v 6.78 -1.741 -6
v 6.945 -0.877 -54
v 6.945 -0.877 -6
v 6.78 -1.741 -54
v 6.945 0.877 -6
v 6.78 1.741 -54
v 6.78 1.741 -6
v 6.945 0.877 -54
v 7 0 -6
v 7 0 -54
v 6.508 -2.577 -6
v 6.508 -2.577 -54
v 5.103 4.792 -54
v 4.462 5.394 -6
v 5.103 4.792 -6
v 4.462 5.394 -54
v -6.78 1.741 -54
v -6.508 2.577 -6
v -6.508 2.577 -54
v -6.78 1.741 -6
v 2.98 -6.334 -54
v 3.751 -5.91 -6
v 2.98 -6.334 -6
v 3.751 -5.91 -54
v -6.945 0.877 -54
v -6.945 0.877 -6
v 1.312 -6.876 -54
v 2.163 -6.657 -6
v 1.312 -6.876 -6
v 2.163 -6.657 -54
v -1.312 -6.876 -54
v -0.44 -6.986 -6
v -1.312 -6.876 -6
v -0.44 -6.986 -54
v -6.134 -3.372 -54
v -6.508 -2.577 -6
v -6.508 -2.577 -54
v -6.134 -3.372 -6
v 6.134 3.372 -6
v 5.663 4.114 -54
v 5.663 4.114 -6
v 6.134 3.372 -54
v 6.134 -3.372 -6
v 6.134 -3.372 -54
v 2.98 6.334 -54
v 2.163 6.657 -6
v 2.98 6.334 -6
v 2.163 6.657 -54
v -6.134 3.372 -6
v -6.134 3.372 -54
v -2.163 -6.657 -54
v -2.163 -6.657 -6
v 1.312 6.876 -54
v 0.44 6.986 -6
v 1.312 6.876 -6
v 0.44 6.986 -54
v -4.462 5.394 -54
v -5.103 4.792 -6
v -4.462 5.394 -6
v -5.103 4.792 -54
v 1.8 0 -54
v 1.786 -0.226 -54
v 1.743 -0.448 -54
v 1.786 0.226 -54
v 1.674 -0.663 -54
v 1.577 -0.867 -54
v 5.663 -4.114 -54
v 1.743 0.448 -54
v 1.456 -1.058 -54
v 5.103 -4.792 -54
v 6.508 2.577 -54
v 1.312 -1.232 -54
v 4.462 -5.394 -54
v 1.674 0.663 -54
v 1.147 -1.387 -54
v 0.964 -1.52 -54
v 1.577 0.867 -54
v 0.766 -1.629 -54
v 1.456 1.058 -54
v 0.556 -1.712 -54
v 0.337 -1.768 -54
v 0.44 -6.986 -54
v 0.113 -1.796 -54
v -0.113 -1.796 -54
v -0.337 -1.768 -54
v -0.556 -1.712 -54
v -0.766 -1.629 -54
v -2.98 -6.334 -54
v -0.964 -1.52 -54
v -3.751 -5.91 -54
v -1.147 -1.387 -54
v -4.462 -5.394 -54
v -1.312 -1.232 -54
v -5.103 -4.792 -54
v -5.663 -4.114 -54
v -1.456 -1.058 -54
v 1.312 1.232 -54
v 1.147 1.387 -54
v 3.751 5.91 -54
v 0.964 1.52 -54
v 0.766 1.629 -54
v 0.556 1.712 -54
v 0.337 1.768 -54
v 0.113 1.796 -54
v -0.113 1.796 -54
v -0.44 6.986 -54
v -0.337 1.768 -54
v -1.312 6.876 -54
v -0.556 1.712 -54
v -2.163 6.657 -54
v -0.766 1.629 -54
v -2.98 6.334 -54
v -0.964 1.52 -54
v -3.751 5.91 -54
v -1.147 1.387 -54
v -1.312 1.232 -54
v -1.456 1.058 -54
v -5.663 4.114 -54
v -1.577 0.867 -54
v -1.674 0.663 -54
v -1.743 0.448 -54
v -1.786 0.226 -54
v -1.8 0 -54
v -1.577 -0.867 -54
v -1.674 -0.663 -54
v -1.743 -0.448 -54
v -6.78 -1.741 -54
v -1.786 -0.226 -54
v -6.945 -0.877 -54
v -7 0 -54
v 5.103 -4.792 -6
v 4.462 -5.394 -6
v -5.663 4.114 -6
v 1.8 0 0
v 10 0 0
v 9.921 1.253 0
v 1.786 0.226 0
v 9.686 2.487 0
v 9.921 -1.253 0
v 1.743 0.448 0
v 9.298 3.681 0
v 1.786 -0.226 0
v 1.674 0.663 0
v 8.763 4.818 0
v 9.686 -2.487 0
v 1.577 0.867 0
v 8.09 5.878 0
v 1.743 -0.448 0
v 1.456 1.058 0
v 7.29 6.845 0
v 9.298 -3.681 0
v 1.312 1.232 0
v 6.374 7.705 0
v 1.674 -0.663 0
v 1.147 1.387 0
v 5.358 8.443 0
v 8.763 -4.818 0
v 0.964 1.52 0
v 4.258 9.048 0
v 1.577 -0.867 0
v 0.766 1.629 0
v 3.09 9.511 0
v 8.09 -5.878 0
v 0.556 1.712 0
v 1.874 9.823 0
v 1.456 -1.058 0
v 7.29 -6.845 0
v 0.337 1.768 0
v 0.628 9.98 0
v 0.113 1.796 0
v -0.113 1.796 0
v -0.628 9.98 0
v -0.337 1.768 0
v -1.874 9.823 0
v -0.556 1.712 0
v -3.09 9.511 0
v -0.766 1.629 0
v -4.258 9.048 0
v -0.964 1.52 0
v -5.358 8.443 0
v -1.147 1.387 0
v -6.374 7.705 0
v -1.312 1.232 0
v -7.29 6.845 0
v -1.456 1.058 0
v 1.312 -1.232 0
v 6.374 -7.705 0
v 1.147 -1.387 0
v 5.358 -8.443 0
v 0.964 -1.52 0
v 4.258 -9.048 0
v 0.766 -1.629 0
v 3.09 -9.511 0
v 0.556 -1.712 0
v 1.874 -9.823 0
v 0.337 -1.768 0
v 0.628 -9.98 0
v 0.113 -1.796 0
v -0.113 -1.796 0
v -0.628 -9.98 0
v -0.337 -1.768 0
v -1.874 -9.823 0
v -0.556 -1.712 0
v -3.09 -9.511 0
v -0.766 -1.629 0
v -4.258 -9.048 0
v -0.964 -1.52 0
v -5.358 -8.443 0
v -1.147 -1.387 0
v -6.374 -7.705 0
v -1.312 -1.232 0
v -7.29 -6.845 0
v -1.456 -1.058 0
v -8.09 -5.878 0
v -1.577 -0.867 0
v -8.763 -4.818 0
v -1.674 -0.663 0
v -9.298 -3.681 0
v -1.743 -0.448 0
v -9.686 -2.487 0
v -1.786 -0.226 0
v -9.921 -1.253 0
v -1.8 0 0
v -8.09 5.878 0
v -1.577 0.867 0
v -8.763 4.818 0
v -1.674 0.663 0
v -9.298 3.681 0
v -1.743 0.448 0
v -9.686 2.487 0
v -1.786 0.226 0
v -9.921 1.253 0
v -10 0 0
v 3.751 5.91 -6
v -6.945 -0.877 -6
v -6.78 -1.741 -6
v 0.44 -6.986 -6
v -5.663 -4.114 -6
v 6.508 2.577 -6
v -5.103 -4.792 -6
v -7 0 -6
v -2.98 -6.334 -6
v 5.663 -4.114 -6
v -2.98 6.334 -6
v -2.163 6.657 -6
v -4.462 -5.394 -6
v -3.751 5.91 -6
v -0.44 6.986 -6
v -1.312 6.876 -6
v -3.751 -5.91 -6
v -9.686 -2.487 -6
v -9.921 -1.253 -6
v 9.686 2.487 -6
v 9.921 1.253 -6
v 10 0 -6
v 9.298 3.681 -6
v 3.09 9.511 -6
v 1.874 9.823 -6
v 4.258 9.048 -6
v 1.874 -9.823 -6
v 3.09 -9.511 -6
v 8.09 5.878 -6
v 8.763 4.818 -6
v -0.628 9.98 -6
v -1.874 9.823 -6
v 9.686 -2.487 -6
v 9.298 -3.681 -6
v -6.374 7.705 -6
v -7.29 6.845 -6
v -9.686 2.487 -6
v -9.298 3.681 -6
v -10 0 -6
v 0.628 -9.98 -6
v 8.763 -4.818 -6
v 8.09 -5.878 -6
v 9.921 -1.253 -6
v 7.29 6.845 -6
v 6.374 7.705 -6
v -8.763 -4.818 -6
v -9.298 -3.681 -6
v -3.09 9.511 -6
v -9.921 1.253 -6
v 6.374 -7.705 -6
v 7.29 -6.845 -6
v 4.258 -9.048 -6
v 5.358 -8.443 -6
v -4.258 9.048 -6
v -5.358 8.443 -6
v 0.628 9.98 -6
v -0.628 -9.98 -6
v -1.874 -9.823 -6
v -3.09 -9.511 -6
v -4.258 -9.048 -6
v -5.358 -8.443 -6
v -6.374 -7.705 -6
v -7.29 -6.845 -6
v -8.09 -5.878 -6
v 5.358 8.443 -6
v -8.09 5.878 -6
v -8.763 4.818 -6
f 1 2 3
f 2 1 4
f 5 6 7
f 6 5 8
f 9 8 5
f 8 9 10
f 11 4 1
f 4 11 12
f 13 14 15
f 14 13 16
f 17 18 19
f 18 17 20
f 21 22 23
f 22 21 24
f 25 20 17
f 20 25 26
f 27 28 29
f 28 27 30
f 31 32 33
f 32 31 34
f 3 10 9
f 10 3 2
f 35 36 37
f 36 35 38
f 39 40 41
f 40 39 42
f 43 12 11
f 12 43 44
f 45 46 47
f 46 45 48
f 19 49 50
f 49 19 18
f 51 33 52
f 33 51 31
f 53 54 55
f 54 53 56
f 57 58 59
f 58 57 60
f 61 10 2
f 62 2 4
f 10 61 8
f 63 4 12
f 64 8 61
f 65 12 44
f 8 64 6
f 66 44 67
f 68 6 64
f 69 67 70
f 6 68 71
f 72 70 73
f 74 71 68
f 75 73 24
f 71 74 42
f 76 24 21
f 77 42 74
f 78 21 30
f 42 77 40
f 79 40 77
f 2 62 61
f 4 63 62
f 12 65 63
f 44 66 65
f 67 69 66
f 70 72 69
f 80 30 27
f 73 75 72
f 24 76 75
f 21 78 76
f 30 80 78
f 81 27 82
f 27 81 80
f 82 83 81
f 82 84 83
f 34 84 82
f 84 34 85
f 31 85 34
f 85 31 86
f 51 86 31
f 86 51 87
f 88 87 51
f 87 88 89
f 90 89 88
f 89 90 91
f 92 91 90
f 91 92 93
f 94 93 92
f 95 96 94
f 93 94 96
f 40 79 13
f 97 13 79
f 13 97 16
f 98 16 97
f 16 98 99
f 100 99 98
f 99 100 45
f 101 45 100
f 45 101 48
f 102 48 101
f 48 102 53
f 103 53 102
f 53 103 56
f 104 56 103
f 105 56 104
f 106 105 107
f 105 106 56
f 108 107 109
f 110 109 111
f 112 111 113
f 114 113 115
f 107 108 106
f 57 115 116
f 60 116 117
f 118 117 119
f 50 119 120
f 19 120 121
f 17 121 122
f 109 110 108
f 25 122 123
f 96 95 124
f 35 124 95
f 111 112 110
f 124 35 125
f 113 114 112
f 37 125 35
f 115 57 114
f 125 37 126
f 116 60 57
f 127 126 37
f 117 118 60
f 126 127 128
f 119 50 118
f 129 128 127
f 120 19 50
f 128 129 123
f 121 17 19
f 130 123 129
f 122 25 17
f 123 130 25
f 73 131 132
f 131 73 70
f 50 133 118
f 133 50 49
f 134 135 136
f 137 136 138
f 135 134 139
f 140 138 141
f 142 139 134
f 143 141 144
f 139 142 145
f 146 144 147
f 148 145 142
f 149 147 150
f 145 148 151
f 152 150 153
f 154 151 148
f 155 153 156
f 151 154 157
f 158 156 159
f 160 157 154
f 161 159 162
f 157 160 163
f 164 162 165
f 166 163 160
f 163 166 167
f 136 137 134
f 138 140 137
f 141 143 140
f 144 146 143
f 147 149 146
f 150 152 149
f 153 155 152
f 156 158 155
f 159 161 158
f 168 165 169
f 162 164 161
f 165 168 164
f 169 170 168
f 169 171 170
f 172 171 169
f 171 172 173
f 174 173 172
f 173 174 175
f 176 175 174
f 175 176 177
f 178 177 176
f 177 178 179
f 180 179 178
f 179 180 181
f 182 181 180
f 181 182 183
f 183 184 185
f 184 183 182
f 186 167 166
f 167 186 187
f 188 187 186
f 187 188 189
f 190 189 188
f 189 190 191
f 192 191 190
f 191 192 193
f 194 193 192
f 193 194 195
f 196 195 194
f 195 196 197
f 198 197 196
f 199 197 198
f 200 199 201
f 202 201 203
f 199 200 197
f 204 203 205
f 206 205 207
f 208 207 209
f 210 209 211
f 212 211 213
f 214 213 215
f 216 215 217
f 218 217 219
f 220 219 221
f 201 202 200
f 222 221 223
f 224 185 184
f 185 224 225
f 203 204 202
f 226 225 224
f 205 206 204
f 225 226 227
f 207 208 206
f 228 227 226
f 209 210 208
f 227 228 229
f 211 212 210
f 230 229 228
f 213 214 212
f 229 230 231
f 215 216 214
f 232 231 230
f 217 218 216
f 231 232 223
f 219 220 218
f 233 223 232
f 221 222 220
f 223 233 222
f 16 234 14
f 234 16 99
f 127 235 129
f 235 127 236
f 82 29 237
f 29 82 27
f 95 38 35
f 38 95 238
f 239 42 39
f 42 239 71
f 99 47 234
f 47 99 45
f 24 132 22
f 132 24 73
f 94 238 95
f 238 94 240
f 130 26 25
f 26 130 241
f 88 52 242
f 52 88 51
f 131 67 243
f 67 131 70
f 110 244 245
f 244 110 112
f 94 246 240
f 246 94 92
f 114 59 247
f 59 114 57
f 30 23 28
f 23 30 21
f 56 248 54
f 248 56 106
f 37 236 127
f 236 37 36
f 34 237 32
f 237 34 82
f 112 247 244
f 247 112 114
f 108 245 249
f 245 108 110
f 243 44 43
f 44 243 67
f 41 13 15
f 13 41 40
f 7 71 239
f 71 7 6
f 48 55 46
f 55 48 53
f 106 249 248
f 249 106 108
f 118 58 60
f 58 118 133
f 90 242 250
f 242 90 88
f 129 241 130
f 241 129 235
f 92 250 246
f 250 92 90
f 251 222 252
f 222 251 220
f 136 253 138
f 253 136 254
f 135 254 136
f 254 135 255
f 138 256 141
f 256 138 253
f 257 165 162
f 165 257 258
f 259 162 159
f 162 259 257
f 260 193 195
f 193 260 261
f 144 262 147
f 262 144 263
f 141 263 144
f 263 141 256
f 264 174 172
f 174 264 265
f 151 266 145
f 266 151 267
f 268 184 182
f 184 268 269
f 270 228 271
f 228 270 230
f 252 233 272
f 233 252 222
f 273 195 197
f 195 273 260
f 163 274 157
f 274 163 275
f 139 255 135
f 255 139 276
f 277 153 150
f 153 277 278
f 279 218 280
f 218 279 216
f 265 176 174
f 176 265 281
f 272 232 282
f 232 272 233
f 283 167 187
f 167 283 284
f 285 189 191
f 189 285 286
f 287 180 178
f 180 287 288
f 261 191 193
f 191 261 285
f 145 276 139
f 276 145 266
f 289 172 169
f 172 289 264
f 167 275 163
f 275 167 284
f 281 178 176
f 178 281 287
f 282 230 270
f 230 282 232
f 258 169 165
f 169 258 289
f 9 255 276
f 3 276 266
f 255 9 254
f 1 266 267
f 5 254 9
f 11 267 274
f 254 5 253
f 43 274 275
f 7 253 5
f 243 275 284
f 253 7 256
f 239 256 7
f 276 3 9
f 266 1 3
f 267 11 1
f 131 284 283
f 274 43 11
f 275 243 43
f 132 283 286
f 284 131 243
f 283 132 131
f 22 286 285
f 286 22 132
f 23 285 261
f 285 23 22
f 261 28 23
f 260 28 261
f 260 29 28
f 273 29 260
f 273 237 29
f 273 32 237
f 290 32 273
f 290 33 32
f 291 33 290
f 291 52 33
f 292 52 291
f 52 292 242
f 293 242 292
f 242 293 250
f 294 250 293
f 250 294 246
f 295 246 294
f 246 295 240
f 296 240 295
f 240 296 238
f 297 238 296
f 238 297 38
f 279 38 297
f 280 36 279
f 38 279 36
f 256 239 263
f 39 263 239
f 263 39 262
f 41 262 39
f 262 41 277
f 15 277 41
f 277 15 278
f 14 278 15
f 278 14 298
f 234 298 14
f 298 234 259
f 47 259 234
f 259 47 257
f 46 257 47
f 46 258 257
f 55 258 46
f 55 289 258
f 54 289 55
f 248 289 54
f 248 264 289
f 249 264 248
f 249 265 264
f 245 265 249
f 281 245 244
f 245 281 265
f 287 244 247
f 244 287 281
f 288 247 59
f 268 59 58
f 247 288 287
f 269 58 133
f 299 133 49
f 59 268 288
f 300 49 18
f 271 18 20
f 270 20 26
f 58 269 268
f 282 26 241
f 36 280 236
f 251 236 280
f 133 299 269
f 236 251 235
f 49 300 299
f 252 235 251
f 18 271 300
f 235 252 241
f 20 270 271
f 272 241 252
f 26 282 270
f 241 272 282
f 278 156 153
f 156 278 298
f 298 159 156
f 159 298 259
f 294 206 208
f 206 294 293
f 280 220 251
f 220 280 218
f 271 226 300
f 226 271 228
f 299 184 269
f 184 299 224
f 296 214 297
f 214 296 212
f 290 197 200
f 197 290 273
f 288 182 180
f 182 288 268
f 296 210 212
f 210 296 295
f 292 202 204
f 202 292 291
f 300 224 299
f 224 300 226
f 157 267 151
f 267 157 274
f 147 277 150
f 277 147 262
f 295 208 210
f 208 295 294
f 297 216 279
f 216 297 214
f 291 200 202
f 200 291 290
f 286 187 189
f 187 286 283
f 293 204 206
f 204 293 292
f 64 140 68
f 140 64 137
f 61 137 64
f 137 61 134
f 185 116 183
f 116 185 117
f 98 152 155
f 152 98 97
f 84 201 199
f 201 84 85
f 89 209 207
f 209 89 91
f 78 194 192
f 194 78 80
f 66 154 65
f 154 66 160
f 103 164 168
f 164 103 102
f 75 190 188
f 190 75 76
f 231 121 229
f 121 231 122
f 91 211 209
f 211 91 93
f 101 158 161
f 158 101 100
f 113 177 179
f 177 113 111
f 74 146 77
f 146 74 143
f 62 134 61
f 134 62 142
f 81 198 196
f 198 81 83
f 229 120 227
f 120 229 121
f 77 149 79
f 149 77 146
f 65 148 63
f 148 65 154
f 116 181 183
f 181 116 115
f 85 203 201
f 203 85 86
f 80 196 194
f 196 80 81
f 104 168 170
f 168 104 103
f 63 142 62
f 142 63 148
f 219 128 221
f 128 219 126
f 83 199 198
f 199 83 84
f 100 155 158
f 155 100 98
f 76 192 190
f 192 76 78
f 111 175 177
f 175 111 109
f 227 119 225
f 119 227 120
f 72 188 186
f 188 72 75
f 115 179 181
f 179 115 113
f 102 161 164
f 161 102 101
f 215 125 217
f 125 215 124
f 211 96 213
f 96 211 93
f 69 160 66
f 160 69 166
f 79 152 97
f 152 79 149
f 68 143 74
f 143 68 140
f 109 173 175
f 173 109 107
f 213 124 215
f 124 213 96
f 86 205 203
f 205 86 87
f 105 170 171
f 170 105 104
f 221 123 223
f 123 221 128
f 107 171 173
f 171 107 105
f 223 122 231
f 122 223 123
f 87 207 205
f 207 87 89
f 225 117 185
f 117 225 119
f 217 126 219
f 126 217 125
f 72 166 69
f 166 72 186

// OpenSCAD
$fn = 50;


difference() {
	union() {
		translate(v = [0, 0, -54.0000000000]) {
			cylinder(h = 54, r = 7.0000000000);
		}
		translate(v = [0, 0, -6.0000000000]) {
			cylinder(h = 6, r = 10.0000000000);
		}
	}
	union() {
		#translate(v = [0, 0, -54]) {
			cylinder(h = 54, r = 1.8000000000);
		}
	}
}
